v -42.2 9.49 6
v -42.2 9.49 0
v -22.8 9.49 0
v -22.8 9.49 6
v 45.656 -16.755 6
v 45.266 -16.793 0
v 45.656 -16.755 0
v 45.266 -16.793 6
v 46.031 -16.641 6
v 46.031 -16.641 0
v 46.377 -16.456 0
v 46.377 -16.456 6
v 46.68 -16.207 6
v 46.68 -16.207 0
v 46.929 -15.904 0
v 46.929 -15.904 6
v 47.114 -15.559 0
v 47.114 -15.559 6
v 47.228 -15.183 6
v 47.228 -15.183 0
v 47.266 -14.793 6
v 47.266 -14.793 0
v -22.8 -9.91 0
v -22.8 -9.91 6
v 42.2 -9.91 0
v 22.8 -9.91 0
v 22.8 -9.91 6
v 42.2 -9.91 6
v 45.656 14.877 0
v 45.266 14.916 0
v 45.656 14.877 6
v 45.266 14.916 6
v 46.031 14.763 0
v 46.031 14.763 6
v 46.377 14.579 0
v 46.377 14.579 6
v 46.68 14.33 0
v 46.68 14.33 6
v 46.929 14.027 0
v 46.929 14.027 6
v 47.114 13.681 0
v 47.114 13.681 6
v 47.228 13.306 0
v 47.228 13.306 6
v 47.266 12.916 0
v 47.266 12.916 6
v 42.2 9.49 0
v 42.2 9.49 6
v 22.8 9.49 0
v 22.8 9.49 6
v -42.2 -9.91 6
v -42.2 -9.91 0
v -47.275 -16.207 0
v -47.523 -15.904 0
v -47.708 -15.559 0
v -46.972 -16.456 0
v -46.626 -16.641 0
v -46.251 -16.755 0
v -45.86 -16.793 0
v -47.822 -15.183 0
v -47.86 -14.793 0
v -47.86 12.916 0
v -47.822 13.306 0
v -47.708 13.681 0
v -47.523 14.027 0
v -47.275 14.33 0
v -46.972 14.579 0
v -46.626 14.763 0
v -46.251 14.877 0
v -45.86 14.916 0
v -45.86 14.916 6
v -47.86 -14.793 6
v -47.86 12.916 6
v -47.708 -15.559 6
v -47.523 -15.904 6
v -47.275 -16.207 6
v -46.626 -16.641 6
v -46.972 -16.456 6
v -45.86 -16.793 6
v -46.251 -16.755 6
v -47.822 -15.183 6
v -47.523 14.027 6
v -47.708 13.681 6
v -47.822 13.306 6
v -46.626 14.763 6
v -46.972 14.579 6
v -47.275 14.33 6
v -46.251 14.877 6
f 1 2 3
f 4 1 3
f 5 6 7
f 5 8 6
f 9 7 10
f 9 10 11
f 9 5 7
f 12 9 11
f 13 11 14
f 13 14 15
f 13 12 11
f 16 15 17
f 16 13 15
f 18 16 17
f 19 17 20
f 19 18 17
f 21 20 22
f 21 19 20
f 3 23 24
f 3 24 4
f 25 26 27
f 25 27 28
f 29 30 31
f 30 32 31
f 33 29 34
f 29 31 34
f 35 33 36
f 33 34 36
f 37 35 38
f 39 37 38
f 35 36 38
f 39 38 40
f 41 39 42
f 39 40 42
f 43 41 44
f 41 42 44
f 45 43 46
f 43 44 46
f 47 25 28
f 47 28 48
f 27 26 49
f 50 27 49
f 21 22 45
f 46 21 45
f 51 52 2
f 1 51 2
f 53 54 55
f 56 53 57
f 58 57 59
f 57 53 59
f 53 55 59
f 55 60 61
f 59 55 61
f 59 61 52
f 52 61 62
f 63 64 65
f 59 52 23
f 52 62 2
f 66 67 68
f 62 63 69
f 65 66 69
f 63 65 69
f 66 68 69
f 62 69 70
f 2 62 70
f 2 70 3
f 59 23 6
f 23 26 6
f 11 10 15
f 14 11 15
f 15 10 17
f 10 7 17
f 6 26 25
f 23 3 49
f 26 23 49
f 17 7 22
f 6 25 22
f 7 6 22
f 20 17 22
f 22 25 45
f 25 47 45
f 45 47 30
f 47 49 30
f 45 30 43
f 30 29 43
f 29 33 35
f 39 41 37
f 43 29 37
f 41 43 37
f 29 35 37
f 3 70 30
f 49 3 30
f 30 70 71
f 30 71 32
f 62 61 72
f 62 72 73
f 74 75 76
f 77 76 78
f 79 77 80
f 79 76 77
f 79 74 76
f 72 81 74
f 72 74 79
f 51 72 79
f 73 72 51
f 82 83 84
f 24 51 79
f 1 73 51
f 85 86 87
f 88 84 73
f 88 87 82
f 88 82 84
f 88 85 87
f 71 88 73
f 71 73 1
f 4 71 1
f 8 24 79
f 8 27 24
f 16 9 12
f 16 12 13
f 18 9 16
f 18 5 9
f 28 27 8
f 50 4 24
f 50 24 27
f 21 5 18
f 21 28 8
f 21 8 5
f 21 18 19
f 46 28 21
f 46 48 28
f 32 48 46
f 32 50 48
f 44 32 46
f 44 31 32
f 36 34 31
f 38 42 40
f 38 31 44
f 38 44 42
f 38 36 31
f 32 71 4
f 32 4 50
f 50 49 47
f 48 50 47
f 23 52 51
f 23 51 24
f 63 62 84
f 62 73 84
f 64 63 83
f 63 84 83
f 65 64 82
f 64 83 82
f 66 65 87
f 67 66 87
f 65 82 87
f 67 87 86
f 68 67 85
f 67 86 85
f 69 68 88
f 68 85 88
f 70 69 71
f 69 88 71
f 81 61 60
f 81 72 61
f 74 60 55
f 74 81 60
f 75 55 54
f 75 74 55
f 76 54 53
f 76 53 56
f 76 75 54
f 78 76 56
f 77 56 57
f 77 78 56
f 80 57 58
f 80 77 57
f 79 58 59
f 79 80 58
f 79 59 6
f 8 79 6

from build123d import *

# Parameters (mm, degrees)
SKETCH_W   = 95.126476
SKETCH_H   = 31.708825
SKETCH_W_2 = 19.4
SKETCH_H_2 = 19.4
PAD_DEPTH  = 6
FILLET_R   = 2


with BuildPart() as part:
    # Sketch → Pad (new body)
    with BuildSketch(Plane.XY):
        with Locations((-0.29722, -0.938767)):
            Rectangle(SKETCH_W, SKETCH_H)
        with Locations((-32.5, -0.210358)):
            Rectangle(SKETCH_W_2, SKETCH_H_2, mode=Mode.SUBTRACT)
        with Locations((32.5, -0.210358)):
            Rectangle(SKETCH_W_2, SKETCH_H_2, mode=Mode.SUBTRACT)
    extrude(amount=PAD_DEPTH)

    # Fillet
    fillet_edges = [part.edges().sort_by_distance(p)[0] for p in [
        (47.266018, 14.915645, 3),
        (47.266018, -16.79318, 3),
        (-47.860458, 14.915645, 3),
        (-47.860458, -16.79318, 3),
    ]]
    fillet(fillet_edges, radius=FILLET_R)


solid = part.part
